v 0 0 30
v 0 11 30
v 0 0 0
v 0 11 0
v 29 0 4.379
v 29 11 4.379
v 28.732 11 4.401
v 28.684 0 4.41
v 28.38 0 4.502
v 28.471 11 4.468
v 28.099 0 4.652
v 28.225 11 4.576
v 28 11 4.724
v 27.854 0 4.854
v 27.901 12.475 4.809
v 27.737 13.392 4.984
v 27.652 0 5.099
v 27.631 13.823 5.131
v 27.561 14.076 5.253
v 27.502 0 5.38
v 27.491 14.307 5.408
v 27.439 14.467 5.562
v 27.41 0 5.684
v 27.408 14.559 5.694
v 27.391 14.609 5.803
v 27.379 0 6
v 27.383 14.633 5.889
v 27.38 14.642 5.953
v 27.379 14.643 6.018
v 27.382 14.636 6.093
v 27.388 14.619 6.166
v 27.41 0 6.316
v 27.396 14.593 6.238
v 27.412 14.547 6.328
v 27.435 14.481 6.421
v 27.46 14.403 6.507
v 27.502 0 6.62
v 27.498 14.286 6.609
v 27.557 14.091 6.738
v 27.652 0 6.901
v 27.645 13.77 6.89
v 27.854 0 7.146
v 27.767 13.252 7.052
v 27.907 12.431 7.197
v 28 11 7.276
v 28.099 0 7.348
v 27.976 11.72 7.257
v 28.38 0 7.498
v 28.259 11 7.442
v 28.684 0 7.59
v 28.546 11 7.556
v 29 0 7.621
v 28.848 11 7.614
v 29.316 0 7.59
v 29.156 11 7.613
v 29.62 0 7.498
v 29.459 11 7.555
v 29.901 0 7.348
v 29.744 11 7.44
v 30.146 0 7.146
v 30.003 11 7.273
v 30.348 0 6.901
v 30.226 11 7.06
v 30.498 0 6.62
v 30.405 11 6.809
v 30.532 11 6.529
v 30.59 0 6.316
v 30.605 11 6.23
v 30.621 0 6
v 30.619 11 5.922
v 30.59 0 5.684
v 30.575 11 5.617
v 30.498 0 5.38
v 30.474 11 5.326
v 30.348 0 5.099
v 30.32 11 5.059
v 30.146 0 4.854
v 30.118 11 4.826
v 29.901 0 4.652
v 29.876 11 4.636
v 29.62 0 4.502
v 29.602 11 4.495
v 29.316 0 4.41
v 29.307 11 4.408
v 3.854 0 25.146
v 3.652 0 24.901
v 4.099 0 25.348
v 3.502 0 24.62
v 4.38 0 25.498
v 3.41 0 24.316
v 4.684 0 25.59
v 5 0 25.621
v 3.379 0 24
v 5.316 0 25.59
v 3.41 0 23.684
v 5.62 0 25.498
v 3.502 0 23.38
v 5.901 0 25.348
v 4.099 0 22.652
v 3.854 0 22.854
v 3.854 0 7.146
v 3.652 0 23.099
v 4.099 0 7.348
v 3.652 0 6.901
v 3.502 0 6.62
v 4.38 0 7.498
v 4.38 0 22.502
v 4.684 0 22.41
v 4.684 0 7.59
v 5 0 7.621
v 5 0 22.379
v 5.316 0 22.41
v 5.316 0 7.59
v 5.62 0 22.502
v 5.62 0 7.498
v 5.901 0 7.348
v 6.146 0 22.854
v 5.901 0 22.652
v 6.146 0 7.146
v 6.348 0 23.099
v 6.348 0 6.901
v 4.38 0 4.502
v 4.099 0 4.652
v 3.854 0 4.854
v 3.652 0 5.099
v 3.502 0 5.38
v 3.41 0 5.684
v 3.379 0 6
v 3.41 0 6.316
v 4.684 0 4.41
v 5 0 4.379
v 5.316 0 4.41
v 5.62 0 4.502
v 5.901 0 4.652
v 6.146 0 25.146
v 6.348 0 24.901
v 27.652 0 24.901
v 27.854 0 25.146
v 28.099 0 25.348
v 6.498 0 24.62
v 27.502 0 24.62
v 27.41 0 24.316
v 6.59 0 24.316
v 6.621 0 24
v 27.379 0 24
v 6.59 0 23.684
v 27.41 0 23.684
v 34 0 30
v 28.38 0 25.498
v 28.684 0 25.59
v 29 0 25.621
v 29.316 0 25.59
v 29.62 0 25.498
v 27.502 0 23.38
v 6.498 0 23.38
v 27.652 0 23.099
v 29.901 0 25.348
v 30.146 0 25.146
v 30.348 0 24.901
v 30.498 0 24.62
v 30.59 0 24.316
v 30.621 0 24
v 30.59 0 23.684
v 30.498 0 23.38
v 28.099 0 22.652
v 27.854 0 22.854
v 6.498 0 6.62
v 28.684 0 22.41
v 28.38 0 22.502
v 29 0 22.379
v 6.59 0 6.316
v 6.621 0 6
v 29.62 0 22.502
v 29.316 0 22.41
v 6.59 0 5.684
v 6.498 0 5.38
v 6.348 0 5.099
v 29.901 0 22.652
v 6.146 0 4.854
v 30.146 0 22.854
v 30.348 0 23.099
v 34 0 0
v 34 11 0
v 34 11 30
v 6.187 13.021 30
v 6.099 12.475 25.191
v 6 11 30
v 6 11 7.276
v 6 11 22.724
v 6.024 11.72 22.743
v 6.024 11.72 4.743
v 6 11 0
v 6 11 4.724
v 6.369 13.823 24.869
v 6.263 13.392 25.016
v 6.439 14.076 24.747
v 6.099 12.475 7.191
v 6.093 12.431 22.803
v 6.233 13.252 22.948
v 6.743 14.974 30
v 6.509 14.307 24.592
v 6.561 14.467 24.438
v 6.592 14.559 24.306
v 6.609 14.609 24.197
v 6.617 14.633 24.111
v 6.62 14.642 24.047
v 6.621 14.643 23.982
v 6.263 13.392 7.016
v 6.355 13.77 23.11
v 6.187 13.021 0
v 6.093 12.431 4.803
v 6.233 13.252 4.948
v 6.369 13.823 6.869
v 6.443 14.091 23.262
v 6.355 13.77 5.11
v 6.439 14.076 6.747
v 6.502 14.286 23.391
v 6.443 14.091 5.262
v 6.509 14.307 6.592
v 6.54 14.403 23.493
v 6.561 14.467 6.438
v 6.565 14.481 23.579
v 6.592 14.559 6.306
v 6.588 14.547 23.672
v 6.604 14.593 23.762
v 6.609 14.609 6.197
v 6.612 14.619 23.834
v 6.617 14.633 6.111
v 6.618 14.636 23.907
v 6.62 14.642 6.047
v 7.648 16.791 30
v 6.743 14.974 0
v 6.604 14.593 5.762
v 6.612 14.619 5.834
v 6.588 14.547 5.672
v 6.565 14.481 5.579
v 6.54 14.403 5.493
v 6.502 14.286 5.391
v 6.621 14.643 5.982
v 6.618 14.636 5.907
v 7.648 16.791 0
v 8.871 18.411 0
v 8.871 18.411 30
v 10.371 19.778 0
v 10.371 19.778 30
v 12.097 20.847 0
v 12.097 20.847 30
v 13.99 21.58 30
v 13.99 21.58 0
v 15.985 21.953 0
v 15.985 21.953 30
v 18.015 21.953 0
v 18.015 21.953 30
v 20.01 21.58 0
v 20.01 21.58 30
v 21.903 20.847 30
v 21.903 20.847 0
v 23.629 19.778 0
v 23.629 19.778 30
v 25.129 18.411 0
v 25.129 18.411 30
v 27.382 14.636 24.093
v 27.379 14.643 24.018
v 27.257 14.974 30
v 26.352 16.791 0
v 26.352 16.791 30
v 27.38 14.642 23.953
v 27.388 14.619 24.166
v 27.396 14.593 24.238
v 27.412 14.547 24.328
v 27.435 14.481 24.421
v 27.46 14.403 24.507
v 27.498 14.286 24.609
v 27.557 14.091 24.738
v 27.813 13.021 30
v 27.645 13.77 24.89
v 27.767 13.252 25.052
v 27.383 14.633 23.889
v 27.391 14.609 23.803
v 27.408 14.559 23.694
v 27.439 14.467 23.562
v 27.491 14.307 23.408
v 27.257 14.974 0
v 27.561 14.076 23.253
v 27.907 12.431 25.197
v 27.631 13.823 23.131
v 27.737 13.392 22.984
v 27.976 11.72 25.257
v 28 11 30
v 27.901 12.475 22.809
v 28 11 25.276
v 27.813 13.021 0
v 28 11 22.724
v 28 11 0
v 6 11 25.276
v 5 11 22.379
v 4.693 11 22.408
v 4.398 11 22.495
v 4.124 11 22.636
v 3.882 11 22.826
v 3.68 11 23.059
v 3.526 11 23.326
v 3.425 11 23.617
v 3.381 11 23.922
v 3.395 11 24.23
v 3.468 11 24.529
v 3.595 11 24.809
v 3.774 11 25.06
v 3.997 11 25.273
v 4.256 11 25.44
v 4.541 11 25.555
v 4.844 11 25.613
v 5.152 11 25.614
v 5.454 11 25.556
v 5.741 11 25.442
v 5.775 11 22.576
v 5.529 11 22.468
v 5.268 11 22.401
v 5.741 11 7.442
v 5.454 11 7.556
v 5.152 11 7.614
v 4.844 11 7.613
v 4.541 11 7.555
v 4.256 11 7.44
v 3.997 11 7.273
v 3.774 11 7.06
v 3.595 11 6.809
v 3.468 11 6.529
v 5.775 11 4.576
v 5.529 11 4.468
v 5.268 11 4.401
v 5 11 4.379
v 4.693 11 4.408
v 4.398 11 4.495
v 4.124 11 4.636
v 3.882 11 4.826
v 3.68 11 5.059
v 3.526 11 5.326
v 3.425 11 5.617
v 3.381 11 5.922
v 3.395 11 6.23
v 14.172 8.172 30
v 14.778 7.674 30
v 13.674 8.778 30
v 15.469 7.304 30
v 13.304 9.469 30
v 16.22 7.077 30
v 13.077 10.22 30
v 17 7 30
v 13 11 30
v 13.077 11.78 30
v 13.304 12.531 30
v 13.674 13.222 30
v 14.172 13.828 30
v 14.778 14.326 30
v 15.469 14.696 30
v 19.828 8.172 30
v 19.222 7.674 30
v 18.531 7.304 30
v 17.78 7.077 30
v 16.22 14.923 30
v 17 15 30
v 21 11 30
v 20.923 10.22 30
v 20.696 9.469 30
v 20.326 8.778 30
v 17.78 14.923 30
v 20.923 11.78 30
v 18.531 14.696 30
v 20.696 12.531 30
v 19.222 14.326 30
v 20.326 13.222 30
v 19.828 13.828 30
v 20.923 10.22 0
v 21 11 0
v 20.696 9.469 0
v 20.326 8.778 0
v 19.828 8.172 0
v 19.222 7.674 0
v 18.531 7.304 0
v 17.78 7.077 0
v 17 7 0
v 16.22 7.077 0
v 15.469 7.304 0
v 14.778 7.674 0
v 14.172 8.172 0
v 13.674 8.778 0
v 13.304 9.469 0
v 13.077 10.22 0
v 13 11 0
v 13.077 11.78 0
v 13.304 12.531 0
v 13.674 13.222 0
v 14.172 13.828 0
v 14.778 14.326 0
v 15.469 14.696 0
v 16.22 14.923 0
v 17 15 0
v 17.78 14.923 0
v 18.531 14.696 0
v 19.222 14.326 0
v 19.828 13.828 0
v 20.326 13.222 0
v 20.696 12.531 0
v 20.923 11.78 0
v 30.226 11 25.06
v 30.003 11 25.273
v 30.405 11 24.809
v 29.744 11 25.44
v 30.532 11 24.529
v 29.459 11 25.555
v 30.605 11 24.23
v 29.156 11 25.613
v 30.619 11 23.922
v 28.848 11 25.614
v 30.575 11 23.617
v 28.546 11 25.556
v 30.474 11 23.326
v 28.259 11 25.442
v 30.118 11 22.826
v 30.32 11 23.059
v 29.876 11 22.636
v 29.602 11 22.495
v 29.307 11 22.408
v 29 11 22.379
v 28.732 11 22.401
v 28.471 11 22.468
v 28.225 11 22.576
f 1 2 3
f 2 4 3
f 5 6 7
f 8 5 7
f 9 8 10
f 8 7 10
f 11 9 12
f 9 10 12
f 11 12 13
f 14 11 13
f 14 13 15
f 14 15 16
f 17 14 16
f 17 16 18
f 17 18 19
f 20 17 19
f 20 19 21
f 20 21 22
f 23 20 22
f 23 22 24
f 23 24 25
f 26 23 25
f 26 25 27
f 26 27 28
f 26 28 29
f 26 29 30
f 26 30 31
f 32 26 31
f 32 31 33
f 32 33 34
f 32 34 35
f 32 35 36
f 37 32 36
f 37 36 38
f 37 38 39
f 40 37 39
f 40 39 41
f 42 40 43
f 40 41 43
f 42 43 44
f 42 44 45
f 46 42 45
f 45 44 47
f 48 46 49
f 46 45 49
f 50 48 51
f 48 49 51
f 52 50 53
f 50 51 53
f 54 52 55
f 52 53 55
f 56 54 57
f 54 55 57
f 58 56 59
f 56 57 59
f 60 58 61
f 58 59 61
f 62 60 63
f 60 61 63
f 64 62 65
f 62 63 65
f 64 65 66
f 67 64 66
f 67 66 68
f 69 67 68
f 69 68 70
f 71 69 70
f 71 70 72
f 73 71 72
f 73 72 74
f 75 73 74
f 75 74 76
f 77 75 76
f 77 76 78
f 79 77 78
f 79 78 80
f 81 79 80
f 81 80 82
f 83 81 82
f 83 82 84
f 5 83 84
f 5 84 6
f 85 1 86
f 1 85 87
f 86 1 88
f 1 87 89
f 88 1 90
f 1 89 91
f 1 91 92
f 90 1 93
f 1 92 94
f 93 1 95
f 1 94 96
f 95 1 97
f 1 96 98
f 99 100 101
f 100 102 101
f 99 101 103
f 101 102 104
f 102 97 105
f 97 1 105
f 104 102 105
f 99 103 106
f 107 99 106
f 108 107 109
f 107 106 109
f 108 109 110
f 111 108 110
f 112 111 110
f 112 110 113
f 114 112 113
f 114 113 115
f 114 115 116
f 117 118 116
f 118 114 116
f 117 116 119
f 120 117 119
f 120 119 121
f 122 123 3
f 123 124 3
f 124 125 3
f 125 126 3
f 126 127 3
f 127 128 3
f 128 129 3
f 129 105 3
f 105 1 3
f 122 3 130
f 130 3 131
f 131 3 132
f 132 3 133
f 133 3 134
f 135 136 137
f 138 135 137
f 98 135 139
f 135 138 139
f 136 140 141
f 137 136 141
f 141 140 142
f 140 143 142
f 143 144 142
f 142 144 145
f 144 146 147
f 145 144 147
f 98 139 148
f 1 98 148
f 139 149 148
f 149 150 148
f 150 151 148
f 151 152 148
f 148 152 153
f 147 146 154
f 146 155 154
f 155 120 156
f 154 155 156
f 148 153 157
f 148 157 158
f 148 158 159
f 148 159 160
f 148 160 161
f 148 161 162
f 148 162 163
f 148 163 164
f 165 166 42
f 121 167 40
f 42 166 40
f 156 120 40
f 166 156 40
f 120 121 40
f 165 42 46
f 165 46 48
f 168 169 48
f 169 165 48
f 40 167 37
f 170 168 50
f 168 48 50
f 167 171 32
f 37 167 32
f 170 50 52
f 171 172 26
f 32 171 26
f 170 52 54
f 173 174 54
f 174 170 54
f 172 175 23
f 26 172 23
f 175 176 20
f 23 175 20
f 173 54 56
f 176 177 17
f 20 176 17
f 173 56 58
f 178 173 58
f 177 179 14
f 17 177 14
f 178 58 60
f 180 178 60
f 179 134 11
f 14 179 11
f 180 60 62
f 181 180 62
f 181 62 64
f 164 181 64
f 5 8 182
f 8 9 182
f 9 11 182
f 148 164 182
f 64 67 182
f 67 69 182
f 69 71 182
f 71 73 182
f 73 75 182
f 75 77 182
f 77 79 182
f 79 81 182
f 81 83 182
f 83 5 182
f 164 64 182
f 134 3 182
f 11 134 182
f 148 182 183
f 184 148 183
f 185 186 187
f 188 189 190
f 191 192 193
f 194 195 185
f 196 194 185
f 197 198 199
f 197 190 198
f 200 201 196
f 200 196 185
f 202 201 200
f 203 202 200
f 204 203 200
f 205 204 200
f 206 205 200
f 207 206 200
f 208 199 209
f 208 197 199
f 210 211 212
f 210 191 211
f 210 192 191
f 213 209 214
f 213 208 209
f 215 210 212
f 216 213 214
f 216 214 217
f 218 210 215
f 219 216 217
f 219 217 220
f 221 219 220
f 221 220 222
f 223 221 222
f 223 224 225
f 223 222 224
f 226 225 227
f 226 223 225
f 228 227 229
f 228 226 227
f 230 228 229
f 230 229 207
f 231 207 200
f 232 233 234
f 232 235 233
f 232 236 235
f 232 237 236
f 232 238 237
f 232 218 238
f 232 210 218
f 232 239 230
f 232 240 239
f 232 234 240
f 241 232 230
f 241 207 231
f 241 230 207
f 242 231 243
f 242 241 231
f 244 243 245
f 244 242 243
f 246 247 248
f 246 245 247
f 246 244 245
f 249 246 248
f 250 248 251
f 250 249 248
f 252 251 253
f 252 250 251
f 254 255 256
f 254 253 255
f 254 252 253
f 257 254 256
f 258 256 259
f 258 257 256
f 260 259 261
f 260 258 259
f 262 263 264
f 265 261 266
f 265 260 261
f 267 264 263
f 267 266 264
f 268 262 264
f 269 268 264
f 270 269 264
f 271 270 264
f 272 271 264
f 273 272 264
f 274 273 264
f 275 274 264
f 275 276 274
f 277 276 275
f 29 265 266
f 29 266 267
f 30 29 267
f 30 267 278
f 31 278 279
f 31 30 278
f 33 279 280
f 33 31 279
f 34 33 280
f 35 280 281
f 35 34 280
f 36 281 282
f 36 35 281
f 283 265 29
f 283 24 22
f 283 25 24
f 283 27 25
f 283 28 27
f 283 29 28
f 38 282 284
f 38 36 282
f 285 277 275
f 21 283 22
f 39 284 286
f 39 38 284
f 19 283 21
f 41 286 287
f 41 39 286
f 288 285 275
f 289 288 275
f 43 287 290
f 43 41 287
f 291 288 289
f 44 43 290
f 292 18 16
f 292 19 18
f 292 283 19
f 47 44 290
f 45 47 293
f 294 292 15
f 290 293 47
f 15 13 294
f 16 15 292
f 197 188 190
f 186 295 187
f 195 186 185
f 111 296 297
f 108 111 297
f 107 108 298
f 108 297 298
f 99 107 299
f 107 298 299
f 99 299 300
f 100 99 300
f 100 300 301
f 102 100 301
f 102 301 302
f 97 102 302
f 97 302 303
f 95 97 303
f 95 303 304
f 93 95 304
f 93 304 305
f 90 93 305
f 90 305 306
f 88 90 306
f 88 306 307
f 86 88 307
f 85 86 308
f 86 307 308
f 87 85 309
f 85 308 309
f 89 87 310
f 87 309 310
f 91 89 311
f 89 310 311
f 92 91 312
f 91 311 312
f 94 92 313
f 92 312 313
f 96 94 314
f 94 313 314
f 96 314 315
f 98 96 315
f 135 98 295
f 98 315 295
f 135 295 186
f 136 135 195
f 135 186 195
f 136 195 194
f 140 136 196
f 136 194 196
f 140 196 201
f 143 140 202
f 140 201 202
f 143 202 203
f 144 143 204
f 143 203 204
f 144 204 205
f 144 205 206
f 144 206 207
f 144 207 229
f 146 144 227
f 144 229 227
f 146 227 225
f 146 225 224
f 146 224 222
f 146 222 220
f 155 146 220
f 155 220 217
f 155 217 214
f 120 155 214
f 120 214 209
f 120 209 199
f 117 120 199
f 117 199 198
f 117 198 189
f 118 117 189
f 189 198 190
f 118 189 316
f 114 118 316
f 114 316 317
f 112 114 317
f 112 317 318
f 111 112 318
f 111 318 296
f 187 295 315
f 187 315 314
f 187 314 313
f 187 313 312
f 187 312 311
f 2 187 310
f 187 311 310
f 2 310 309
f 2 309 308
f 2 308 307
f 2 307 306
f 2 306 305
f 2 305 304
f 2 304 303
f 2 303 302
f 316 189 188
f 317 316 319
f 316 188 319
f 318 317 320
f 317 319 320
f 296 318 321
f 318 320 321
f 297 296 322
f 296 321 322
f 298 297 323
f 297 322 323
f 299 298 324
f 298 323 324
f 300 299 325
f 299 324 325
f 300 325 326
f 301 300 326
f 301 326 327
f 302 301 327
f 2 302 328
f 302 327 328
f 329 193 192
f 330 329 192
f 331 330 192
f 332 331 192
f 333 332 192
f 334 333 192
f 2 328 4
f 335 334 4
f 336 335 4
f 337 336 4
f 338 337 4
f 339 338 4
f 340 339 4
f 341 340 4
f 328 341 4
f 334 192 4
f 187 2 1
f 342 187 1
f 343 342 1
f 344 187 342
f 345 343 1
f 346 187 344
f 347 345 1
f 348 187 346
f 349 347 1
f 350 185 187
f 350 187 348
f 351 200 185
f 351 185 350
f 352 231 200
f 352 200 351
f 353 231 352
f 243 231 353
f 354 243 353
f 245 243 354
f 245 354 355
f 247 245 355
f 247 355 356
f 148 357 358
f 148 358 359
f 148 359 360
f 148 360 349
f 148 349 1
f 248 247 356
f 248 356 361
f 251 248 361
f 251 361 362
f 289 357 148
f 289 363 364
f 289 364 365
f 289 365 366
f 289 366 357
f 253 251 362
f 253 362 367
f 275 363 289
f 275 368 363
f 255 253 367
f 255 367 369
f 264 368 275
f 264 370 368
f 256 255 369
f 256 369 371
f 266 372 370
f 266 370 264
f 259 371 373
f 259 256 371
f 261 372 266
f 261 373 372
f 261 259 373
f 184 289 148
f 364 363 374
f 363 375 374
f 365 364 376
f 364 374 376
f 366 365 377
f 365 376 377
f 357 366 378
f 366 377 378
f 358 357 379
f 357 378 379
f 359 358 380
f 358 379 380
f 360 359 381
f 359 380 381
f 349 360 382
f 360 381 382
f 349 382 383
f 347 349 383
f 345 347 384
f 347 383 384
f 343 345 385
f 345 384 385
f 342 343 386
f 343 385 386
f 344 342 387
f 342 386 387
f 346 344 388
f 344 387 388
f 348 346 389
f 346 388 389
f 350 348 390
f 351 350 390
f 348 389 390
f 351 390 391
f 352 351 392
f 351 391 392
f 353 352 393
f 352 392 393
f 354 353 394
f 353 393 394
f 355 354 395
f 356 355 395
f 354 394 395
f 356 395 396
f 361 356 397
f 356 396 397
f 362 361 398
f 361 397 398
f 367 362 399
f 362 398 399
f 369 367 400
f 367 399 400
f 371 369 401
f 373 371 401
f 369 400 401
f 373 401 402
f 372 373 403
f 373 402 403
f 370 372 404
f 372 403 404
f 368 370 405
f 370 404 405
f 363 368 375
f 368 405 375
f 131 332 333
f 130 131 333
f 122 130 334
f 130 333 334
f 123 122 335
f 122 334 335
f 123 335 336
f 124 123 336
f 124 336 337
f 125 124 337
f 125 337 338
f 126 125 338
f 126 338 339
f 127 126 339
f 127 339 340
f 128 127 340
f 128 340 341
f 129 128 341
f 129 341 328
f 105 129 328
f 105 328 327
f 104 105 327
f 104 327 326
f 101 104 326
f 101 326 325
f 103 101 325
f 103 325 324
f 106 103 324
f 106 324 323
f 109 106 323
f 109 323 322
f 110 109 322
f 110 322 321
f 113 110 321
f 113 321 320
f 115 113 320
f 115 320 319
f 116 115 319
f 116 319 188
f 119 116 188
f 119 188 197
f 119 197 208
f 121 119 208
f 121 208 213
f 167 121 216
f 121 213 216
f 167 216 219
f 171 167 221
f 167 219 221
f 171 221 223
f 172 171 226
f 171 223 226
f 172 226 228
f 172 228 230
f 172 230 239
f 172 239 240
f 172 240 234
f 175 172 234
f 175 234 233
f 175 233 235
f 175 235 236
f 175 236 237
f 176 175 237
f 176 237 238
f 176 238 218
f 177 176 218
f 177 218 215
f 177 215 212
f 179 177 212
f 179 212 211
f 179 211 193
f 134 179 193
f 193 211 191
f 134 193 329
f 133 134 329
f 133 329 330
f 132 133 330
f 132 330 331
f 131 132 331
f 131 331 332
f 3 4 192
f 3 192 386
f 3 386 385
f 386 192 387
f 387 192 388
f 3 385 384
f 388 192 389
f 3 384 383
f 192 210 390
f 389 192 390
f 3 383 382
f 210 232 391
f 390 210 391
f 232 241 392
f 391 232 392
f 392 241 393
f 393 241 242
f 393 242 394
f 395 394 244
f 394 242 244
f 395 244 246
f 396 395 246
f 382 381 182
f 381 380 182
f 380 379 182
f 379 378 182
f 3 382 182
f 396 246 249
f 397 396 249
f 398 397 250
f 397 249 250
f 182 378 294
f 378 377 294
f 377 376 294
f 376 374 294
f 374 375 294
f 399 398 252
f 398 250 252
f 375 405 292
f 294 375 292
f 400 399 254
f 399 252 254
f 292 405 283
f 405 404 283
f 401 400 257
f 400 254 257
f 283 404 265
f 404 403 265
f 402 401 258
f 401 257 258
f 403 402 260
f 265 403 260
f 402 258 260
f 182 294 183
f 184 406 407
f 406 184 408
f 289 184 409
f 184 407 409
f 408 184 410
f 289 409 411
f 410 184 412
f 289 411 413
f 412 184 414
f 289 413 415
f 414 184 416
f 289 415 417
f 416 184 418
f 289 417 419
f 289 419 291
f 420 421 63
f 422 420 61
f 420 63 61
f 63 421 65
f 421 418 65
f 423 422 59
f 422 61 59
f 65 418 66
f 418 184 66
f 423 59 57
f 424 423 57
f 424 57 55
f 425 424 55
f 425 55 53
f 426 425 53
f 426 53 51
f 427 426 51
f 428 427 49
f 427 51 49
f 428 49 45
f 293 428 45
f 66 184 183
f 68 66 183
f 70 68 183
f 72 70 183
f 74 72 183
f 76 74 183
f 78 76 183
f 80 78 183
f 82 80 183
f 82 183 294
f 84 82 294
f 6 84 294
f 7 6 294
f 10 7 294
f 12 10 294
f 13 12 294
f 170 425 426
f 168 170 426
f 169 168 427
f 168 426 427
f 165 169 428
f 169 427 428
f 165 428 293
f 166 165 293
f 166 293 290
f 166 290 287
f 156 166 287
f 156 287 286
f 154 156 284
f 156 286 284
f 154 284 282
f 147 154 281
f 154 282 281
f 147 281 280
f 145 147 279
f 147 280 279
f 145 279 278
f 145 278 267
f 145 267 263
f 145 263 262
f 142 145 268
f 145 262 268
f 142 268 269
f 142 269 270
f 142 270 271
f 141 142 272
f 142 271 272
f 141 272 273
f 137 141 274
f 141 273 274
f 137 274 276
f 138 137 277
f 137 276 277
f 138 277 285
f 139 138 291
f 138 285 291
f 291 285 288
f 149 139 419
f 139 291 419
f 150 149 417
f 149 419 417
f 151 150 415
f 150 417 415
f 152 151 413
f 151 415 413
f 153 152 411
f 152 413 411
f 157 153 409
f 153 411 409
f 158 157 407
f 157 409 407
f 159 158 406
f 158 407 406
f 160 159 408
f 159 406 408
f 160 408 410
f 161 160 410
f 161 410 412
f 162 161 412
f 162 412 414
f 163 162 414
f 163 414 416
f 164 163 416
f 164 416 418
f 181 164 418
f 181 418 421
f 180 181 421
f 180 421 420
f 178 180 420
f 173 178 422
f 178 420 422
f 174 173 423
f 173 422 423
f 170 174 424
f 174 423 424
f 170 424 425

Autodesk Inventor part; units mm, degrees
ref_plane "YZ Plane" through (0, 0, 0) normal (1, 0, 0) x (0, 1, 0)
ref_plane "XZ Plane" through (0, 0, 0) normal (0, 1, 0) x (-1, 0, 0)
ref_plane "XY Plane" through (0, 0, 0) normal (0, 0, 1) x (1, 0, 0)
sketch "Sketch1" plane through (0, 0, 0) normal (0, 0, 1) x (1, 0, 0)
  line L0 (0, 0) -> (34, 0)
  line L1 (34, 0) -> (34, 11)
  line L2 (34, 11) -> (0, 11)
  line L3 (0, 11) -> (0, 0)
  circle A0 centre (17, 11) radius 11
  circle A1 centre (17, 11) radius 4
  line L4 (9.5554, 22) -> (24.3175, 22)
  point P0 (28, 11)
  point P1 (6, 11)
  dimension "d0" = 34
  dimension "d1" = 11
  dimension "d3" = 8
  dimension "d4" = 22
extrude "Extrusion1" add sketch "Sketch1" along normal blind 30 contours L3 L2 A0 L0 | A0 L2 L1 L0 | A0 L2 A1 | A0 L2 A1
sketch "Sketch2" plane through (0, 0, 0) normal (0, -1, 0) x (1, 0, 0)
  line L0 (34, 0) -> (34, 30) projected
  line L1 (0, 0) -> (0, 30) projected
  line L2 (0, 0) -> (34, 0) projected
  line L3 (0, 30) -> (34, 30) projected
  point P0 (5, 24)
  point P1 (29, 24)
  point P2 (29, 6)
  point P3 (5, 6)
  dimension "d7" = 24
  dimension "d8" = 18
  dimension "d9" = 5
  dimension "d10" = 5
  dimension "d11" = 6
  dimension "d12" = 6
hole "Hole1" at (5, 0, 24) at (29, 0, 24) at (29, 0, 6) at (5, 0, 6) direction (0, 1, 0) diameter 3.242 end through all thread size "M4x0.7" class "6H" standard "ANSI Metric M Profile"
equation "\"d9\" = d10"
equation "\"d11\" = d12"
properties part number "Pillow block bearing"
